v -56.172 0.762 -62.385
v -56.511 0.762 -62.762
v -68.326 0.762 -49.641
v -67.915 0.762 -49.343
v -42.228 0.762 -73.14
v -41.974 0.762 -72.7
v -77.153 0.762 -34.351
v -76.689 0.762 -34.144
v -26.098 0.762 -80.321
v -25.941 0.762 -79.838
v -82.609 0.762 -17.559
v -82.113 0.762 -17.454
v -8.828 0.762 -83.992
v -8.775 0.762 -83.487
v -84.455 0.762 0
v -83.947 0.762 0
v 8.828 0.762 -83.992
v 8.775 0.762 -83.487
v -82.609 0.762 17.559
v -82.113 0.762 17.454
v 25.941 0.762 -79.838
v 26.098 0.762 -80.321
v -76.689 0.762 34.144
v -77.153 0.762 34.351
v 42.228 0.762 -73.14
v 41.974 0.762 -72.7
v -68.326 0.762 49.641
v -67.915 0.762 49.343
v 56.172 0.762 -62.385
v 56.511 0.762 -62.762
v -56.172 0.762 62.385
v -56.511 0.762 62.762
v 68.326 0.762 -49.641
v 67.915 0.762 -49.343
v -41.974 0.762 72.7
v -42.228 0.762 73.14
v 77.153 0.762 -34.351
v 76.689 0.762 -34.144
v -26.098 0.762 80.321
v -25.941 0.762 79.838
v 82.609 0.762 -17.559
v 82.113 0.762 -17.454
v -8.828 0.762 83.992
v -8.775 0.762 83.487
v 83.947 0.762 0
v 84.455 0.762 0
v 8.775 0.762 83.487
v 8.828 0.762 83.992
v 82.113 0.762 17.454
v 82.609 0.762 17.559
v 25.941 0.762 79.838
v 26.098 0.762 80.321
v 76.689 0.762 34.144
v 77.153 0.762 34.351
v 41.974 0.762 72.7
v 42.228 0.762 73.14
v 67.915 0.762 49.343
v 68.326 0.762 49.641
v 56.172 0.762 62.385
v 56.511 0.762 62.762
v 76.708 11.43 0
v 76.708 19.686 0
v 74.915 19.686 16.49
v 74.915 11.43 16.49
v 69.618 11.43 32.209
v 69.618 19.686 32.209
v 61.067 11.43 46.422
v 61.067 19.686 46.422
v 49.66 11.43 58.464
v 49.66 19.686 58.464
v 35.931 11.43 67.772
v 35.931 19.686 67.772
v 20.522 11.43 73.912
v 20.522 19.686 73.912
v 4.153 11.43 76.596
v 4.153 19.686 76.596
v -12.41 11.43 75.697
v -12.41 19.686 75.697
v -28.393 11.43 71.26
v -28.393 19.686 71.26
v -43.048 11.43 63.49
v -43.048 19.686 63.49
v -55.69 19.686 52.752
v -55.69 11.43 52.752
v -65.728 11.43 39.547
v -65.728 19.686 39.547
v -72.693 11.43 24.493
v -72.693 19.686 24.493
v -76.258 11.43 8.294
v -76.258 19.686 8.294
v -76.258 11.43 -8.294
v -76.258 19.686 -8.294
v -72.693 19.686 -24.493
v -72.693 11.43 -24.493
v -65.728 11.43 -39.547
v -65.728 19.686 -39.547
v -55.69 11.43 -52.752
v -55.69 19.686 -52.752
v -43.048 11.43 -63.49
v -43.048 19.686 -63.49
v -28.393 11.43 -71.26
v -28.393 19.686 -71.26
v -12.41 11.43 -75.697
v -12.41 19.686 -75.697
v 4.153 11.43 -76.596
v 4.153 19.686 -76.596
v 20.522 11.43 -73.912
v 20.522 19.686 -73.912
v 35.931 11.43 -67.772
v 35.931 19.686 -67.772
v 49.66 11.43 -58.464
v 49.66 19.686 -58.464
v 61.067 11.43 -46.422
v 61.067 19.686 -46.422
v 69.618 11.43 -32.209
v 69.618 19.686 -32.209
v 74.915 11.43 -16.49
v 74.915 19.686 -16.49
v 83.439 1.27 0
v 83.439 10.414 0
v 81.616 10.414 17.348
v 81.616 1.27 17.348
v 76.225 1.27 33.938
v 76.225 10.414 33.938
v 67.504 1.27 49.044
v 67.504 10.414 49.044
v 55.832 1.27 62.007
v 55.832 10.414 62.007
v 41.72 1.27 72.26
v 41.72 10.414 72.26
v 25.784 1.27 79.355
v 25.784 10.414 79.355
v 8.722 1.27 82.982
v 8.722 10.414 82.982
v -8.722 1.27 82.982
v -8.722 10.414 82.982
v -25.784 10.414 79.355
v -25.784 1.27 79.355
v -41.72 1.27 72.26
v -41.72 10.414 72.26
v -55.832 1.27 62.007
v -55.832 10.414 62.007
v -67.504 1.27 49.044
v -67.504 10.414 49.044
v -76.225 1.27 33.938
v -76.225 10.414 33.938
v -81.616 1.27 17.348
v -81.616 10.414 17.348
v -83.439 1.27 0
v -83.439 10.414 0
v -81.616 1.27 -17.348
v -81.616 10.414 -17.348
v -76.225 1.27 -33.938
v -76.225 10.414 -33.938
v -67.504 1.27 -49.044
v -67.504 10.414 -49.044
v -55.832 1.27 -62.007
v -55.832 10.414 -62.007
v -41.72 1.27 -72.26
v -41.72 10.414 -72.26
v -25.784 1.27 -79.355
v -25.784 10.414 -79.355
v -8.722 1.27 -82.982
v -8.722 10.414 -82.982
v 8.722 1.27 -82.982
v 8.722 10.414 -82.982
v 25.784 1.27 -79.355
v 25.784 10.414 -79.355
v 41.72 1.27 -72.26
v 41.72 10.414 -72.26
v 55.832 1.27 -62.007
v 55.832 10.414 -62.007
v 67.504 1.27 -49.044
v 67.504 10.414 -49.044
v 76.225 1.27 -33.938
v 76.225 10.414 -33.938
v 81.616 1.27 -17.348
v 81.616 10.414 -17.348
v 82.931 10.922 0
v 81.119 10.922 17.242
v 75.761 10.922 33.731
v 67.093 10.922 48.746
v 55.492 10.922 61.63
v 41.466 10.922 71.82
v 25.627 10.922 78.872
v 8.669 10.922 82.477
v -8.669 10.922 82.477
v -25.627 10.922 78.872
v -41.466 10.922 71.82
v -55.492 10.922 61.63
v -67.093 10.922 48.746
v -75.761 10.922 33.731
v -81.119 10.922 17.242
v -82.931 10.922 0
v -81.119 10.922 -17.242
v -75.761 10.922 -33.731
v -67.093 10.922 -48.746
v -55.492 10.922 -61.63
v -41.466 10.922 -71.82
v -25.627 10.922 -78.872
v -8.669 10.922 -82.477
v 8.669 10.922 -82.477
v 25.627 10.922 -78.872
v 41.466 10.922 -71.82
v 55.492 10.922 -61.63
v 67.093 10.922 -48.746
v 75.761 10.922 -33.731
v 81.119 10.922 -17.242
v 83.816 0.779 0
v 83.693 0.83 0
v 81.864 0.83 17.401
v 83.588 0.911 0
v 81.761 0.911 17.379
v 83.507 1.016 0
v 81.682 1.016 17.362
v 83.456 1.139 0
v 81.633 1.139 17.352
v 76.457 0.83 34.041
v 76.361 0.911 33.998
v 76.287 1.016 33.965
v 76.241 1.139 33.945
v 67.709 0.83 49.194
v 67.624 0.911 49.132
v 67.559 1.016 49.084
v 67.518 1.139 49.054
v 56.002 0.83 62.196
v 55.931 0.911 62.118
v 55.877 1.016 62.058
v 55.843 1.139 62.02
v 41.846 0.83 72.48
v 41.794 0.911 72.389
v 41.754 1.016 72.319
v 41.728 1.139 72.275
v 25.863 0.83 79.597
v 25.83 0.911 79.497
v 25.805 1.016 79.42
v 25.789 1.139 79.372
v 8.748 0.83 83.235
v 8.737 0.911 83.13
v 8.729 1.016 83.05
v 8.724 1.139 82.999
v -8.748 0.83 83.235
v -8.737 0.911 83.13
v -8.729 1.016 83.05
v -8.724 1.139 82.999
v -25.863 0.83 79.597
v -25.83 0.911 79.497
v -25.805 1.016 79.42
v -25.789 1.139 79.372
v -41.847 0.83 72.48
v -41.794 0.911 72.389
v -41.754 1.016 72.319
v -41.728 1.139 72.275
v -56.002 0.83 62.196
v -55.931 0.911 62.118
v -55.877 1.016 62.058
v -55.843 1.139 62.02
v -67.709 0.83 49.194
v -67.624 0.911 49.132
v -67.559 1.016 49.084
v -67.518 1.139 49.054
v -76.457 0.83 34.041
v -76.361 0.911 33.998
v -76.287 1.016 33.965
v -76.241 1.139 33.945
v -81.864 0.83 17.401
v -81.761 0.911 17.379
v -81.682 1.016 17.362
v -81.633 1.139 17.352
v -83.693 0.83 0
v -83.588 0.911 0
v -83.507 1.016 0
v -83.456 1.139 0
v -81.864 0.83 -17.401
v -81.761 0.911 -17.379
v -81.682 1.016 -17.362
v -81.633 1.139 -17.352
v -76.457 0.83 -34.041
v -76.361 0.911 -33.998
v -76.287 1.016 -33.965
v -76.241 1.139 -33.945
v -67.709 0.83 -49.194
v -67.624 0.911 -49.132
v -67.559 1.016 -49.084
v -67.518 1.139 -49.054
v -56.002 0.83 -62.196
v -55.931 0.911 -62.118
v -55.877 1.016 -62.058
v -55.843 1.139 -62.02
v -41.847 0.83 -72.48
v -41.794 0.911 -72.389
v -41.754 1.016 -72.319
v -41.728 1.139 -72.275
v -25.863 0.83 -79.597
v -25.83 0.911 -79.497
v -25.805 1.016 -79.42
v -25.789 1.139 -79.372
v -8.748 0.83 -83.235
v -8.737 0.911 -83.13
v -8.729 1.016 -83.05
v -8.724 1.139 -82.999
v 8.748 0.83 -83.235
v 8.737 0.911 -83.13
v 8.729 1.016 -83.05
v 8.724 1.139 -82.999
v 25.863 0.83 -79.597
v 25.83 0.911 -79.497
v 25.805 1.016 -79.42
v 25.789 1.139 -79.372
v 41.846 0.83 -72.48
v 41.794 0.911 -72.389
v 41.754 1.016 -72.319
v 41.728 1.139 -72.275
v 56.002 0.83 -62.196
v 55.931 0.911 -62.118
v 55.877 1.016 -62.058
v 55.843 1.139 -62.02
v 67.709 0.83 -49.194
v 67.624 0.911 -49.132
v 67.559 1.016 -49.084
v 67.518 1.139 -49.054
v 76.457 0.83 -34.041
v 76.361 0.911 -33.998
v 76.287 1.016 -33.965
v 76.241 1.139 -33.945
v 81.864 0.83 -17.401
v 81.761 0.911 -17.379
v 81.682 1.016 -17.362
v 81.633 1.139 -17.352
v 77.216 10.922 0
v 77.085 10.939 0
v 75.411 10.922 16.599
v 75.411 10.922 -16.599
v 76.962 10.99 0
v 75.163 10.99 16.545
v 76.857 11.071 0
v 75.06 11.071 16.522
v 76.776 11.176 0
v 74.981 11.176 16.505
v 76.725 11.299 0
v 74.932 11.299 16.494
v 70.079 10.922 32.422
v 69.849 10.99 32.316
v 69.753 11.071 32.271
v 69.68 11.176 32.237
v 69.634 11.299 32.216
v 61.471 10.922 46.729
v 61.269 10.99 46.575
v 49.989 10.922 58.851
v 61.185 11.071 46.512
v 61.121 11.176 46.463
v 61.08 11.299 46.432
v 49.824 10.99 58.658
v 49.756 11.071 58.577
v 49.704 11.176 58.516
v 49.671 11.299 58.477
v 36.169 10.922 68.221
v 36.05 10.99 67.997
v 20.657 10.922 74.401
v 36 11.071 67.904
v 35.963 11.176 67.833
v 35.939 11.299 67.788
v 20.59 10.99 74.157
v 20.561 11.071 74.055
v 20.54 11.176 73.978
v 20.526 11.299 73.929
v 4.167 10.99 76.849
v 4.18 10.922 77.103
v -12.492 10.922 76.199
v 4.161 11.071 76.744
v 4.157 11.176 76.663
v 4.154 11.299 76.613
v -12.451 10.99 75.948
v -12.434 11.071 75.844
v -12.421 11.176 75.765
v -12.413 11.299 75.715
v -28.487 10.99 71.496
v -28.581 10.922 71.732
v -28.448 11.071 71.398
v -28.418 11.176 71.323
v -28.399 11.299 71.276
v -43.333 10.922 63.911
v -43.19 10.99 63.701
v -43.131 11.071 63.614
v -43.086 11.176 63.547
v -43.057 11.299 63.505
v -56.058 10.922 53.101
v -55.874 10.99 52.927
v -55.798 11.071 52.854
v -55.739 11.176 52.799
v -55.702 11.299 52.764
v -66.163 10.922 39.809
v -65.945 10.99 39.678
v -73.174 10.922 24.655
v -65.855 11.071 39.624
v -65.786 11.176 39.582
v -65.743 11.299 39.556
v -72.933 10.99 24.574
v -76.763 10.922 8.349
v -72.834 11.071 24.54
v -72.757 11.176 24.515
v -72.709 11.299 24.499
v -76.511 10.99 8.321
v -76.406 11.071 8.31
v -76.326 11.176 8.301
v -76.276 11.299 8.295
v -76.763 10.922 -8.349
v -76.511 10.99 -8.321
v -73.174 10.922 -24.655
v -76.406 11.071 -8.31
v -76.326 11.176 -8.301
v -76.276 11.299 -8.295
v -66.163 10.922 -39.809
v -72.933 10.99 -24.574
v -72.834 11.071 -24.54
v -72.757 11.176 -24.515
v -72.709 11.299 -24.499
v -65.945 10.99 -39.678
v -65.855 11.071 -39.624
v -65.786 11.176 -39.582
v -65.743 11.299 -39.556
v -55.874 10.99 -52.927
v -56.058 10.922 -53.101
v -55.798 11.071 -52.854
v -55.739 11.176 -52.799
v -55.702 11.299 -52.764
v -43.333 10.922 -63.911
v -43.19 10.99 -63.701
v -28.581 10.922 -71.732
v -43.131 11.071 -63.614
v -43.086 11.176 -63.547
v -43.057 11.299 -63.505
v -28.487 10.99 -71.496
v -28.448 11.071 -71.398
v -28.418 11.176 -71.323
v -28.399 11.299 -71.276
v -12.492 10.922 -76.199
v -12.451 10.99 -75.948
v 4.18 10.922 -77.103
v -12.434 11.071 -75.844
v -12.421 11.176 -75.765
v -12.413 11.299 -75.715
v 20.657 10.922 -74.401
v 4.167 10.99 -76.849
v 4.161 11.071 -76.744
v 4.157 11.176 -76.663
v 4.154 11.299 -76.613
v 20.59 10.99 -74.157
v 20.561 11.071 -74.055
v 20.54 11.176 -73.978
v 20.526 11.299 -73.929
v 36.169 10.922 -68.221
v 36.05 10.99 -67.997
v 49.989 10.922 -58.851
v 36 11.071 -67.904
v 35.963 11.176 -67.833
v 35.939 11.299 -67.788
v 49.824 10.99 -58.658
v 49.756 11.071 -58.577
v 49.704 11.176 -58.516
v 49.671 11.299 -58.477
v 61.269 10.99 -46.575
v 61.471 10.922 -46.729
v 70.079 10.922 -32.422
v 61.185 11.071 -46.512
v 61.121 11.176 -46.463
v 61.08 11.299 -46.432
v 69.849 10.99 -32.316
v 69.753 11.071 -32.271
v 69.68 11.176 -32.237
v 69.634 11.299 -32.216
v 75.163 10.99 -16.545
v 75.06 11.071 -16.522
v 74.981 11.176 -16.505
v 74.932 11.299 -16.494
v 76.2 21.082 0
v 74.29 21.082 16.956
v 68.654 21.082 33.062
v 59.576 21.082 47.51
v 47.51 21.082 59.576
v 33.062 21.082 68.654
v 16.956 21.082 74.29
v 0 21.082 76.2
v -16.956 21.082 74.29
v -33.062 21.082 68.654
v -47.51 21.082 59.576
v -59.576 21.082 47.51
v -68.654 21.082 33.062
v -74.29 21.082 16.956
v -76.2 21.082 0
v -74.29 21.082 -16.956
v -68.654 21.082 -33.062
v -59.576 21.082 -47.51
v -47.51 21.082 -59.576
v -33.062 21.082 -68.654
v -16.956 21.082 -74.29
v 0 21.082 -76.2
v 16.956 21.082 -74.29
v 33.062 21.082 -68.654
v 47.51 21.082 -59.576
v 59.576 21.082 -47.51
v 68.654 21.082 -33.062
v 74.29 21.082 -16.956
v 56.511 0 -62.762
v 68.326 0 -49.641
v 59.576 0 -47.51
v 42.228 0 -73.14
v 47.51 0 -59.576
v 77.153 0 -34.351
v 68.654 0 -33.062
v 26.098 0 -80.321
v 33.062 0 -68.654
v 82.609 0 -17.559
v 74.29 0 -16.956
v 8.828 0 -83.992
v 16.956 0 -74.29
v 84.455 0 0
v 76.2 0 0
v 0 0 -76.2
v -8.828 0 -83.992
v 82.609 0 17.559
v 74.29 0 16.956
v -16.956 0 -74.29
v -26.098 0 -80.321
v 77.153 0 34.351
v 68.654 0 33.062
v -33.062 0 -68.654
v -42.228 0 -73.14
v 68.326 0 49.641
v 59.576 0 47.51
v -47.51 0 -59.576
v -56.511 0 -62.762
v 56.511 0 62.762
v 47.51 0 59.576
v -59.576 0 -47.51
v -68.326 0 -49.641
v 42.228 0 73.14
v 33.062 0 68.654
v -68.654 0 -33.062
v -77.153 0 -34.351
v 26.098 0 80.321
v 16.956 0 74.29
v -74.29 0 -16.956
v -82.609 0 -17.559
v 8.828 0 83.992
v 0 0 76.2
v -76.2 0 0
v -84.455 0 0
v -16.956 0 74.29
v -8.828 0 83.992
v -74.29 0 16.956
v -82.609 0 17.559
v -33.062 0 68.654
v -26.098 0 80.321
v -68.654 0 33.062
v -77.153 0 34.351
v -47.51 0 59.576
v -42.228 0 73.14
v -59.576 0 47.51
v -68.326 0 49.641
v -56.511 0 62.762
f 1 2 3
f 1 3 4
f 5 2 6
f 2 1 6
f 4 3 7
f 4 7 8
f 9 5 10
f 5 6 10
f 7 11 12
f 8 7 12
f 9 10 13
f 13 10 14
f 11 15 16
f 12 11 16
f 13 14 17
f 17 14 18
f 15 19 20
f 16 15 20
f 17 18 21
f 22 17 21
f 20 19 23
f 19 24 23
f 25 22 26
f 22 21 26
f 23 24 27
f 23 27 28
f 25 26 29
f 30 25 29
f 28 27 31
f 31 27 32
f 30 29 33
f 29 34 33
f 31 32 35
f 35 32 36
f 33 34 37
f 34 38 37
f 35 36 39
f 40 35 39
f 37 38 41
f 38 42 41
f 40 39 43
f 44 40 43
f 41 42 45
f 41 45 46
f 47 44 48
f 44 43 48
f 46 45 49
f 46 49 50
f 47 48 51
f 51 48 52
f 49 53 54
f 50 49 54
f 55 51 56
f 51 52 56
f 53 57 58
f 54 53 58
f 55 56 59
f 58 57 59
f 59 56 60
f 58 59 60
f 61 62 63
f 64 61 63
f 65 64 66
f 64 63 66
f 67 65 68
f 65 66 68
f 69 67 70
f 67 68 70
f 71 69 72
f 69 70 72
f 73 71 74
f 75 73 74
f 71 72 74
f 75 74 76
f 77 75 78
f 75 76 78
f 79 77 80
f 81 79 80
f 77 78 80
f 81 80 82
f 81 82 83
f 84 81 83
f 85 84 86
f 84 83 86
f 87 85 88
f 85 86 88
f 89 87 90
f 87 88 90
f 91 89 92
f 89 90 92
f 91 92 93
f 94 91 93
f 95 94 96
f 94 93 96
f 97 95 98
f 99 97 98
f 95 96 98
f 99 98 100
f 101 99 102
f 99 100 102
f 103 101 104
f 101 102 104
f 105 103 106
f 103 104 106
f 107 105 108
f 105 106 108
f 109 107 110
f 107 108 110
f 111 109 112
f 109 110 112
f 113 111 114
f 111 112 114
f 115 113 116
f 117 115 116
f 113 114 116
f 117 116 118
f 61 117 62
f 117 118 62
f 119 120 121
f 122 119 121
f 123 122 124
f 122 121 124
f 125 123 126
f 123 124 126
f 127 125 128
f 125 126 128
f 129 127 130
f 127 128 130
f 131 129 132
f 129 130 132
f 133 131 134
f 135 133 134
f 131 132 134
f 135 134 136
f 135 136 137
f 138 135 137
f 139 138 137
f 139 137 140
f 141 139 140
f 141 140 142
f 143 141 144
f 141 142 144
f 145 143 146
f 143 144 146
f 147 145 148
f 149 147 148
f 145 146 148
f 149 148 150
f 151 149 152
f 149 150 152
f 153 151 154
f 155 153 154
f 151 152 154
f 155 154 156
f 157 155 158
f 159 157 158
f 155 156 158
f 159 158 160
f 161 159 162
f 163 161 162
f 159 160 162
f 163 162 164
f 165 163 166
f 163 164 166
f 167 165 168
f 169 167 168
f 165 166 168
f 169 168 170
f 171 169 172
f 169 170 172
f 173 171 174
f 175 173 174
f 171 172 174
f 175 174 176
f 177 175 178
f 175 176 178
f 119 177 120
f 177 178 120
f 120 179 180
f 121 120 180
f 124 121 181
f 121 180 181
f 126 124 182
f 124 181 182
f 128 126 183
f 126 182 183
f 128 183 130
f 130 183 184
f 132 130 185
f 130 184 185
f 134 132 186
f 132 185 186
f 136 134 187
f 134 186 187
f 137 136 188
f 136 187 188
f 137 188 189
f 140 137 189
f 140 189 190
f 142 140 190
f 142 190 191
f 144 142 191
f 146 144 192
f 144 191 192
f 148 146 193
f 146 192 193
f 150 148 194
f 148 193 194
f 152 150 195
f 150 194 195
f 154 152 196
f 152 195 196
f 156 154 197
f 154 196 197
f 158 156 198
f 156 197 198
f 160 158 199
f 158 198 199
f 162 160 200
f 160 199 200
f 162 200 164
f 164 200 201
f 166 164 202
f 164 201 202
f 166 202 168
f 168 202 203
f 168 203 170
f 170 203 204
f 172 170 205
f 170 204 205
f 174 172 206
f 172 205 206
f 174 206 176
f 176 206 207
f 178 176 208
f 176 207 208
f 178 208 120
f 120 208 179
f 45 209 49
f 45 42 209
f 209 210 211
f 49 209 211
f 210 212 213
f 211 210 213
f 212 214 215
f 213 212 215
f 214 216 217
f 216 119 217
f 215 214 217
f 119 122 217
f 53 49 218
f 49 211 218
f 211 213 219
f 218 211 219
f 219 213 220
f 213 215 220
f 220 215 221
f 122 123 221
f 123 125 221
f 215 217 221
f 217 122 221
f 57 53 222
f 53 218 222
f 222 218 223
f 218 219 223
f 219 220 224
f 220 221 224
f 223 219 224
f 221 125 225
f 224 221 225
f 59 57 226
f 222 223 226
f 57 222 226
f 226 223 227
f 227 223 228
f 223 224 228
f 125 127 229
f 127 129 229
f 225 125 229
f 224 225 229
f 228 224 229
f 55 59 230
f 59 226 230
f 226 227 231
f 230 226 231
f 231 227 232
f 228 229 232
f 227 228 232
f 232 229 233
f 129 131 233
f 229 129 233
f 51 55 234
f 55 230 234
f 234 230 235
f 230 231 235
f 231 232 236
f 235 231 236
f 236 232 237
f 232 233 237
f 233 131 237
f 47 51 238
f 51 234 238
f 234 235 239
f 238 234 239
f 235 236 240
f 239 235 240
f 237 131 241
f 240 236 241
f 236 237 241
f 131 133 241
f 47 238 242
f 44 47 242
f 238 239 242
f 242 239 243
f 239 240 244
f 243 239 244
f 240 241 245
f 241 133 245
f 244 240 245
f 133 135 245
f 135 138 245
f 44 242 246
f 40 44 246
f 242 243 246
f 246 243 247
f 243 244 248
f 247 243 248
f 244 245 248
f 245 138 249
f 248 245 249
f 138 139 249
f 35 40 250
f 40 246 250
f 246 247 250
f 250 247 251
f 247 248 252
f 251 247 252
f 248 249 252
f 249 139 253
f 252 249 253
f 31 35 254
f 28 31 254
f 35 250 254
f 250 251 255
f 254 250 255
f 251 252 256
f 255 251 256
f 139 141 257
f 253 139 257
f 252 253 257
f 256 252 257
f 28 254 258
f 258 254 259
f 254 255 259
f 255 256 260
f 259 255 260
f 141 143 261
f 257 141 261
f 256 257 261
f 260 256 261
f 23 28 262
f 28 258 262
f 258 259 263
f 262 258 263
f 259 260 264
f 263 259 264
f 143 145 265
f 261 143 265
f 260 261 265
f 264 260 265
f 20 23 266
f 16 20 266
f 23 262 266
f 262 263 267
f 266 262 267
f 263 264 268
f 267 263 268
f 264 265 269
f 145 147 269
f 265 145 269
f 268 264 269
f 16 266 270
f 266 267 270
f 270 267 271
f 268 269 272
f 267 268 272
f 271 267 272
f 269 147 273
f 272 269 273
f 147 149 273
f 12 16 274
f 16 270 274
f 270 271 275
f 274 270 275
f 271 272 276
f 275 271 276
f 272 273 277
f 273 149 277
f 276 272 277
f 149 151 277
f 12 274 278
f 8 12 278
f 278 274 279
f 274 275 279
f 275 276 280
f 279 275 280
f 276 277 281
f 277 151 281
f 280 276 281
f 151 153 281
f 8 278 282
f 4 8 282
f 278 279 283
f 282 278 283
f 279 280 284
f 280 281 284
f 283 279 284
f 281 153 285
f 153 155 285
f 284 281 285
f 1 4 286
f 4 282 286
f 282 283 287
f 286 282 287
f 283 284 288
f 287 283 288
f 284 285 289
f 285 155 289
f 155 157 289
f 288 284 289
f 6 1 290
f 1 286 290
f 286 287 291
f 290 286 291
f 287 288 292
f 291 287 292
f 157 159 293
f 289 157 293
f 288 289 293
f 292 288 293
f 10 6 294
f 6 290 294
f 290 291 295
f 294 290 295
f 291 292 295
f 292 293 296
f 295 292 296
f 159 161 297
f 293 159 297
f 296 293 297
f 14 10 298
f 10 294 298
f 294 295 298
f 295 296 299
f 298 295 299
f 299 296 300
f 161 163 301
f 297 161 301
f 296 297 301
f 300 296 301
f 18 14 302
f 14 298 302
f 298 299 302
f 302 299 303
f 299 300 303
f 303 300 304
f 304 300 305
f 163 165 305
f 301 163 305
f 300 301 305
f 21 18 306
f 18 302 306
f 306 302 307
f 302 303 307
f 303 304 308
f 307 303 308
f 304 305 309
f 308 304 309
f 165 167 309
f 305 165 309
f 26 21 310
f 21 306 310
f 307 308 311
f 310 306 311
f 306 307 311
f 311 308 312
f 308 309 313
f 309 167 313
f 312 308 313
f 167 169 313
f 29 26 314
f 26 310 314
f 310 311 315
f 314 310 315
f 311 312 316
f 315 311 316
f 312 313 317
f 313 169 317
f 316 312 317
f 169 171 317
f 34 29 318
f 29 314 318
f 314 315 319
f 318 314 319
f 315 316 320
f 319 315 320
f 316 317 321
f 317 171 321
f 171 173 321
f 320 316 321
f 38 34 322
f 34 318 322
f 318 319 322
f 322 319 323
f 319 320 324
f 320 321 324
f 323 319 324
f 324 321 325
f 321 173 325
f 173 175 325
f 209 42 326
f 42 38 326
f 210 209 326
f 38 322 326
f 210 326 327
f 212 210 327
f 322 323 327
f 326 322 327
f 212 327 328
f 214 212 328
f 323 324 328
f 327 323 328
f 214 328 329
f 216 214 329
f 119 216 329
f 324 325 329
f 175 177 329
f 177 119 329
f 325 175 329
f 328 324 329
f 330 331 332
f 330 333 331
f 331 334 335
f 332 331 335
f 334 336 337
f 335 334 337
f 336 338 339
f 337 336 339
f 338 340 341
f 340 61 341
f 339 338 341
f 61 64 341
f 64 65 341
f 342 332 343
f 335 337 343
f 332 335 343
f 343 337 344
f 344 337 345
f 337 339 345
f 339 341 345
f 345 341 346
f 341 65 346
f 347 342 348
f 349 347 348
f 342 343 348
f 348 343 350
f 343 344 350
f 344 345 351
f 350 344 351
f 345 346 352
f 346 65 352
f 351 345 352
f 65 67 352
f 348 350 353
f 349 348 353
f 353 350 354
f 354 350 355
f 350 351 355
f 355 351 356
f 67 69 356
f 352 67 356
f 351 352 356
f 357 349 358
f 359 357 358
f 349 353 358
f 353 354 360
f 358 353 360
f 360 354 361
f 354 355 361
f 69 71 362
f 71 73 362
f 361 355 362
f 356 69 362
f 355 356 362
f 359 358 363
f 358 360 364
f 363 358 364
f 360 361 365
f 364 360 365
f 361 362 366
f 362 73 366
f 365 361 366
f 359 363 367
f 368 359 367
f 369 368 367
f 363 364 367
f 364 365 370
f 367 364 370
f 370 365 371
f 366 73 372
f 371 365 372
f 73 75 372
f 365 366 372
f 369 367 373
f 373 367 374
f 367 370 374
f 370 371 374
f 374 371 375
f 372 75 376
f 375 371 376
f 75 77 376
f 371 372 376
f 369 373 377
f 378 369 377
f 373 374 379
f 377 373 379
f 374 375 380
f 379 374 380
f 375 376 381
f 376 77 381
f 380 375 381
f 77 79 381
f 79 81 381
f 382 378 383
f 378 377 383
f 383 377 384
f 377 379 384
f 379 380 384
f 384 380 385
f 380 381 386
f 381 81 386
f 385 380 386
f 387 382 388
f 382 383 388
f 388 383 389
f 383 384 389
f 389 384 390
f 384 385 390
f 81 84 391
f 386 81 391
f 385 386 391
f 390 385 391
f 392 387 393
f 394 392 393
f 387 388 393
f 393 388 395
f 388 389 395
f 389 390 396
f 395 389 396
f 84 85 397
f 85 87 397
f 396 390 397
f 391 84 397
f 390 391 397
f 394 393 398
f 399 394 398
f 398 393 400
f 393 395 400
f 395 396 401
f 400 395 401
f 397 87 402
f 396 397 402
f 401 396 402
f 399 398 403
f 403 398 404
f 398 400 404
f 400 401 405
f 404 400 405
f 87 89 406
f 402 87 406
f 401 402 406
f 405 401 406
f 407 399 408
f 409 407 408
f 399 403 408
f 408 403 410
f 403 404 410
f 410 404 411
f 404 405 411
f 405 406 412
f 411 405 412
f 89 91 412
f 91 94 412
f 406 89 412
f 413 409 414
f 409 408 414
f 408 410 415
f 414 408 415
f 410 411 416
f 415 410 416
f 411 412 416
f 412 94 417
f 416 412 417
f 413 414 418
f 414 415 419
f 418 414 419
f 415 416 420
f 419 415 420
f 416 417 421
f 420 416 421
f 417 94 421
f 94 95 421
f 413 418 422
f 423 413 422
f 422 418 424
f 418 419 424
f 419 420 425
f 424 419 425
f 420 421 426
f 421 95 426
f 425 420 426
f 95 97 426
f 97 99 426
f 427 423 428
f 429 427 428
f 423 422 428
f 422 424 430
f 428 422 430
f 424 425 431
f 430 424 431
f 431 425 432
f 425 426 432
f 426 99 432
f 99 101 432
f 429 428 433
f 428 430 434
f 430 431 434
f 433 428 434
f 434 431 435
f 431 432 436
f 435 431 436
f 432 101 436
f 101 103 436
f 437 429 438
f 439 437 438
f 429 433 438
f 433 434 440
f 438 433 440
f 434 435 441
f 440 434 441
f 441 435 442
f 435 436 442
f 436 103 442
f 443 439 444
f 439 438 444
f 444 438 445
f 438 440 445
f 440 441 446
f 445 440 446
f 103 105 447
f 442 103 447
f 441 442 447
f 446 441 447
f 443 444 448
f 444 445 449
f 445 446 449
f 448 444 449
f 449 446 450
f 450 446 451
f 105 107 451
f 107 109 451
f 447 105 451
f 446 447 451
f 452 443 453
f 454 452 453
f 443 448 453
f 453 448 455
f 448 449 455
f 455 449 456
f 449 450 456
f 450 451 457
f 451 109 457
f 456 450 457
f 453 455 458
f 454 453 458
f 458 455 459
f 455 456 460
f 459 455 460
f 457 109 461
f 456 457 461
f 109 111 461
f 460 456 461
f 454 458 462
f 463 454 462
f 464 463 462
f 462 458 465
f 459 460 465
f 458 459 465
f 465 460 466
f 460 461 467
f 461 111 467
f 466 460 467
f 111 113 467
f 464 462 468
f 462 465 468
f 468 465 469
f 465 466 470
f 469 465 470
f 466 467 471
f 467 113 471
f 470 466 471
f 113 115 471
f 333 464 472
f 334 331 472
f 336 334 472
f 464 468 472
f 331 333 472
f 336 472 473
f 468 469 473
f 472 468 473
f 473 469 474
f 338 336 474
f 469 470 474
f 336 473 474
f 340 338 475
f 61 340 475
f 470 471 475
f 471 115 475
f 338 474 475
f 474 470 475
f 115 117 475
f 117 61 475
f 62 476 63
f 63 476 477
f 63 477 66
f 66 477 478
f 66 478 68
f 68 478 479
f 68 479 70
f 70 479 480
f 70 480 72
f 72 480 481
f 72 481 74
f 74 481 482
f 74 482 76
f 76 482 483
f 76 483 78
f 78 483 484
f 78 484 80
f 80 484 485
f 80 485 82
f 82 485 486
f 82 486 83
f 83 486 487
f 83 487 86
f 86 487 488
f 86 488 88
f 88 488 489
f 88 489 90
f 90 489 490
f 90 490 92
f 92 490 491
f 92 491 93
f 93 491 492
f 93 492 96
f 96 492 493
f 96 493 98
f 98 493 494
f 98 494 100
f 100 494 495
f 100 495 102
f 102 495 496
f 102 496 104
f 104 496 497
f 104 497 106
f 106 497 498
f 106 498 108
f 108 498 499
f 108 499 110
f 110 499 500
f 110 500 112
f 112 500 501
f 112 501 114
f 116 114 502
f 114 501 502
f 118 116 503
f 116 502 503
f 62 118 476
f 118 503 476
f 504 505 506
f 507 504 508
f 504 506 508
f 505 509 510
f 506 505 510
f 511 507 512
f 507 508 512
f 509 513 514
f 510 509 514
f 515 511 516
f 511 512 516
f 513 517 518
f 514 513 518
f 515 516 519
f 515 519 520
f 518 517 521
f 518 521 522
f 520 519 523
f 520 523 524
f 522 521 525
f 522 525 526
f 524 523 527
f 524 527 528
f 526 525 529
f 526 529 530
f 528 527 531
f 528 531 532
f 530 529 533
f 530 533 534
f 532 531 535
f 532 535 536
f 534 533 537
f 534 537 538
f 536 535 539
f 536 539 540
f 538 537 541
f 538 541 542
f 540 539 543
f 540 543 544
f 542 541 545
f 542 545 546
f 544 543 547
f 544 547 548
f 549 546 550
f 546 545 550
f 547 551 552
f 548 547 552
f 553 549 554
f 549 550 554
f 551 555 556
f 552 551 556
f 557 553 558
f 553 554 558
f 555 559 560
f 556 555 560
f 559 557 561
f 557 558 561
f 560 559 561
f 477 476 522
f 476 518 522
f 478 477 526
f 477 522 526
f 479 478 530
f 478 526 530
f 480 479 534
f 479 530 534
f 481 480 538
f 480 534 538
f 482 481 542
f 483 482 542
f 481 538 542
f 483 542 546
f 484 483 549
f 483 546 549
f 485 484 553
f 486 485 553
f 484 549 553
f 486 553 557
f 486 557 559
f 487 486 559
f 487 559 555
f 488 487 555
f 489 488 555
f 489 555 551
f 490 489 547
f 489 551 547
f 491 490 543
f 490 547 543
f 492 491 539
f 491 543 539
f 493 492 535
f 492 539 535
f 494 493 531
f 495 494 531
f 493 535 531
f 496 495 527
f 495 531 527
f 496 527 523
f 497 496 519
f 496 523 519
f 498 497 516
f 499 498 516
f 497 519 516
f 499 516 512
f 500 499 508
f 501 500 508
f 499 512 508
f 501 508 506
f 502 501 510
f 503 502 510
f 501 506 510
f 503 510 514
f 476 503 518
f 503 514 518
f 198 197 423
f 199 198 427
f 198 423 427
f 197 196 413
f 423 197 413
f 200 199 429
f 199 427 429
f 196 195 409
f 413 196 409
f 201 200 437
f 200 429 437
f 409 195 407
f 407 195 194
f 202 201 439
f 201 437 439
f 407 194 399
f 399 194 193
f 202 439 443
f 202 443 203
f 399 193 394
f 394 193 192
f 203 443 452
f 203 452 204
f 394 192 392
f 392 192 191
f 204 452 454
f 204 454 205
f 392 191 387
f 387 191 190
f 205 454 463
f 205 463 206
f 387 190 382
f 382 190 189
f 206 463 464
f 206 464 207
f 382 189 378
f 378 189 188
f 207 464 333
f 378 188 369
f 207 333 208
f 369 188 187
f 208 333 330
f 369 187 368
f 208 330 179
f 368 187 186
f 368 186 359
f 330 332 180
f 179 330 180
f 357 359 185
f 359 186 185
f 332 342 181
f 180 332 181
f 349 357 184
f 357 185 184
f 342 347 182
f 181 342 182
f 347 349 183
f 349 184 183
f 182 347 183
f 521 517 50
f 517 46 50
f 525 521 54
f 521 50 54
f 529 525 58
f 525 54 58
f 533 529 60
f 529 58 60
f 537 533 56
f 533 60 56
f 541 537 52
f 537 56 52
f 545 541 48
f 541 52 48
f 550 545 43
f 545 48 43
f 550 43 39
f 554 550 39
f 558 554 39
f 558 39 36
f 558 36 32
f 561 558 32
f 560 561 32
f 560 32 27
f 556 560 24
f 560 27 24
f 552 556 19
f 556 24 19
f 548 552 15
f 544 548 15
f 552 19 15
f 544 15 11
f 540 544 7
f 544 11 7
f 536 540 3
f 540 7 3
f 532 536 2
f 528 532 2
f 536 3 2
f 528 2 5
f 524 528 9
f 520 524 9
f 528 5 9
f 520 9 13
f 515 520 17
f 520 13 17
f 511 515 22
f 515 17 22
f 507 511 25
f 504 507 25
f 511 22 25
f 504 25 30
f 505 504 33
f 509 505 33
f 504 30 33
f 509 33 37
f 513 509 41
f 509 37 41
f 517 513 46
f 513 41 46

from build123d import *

# Parameters (mm, degrees)
FILLET1_R     = 0.508
CHAMFER1_SIZE = 0.508


with BuildPart() as part:
    # Sketch1 → Revolve1 (revolve)
    with BuildSketch(Plane.XY):
        Polygon((76.2, 21.082), (76.2, 0), (84.455, 0), (84.455, 0.762), (83.439, 0.762), (83.439, 10.922), (76.708, 10.922), (76.708, 19.686281471), align=None)
    revolve(axis=Axis((0, 28.738956579, 0), (0, -1, 0)))

    # Fillet1
    fillet1_edges = [part.edges().sort_by_distance(p)[0] for p in [
        (-83.439, 0.762, 0),
        (-76.708, 10.922, 0),
    ]]
    fillet(fillet1_edges, radius=FILLET1_R)

    # Chamfer1
    chamfer1_edges = [part.edges().sort_by_distance(p)[0] for p in [
        (-83.439, 10.922, 0),
    ]]
    chamfer(chamfer1_edges, length=CHAMFER1_SIZE)


solid = part.part
